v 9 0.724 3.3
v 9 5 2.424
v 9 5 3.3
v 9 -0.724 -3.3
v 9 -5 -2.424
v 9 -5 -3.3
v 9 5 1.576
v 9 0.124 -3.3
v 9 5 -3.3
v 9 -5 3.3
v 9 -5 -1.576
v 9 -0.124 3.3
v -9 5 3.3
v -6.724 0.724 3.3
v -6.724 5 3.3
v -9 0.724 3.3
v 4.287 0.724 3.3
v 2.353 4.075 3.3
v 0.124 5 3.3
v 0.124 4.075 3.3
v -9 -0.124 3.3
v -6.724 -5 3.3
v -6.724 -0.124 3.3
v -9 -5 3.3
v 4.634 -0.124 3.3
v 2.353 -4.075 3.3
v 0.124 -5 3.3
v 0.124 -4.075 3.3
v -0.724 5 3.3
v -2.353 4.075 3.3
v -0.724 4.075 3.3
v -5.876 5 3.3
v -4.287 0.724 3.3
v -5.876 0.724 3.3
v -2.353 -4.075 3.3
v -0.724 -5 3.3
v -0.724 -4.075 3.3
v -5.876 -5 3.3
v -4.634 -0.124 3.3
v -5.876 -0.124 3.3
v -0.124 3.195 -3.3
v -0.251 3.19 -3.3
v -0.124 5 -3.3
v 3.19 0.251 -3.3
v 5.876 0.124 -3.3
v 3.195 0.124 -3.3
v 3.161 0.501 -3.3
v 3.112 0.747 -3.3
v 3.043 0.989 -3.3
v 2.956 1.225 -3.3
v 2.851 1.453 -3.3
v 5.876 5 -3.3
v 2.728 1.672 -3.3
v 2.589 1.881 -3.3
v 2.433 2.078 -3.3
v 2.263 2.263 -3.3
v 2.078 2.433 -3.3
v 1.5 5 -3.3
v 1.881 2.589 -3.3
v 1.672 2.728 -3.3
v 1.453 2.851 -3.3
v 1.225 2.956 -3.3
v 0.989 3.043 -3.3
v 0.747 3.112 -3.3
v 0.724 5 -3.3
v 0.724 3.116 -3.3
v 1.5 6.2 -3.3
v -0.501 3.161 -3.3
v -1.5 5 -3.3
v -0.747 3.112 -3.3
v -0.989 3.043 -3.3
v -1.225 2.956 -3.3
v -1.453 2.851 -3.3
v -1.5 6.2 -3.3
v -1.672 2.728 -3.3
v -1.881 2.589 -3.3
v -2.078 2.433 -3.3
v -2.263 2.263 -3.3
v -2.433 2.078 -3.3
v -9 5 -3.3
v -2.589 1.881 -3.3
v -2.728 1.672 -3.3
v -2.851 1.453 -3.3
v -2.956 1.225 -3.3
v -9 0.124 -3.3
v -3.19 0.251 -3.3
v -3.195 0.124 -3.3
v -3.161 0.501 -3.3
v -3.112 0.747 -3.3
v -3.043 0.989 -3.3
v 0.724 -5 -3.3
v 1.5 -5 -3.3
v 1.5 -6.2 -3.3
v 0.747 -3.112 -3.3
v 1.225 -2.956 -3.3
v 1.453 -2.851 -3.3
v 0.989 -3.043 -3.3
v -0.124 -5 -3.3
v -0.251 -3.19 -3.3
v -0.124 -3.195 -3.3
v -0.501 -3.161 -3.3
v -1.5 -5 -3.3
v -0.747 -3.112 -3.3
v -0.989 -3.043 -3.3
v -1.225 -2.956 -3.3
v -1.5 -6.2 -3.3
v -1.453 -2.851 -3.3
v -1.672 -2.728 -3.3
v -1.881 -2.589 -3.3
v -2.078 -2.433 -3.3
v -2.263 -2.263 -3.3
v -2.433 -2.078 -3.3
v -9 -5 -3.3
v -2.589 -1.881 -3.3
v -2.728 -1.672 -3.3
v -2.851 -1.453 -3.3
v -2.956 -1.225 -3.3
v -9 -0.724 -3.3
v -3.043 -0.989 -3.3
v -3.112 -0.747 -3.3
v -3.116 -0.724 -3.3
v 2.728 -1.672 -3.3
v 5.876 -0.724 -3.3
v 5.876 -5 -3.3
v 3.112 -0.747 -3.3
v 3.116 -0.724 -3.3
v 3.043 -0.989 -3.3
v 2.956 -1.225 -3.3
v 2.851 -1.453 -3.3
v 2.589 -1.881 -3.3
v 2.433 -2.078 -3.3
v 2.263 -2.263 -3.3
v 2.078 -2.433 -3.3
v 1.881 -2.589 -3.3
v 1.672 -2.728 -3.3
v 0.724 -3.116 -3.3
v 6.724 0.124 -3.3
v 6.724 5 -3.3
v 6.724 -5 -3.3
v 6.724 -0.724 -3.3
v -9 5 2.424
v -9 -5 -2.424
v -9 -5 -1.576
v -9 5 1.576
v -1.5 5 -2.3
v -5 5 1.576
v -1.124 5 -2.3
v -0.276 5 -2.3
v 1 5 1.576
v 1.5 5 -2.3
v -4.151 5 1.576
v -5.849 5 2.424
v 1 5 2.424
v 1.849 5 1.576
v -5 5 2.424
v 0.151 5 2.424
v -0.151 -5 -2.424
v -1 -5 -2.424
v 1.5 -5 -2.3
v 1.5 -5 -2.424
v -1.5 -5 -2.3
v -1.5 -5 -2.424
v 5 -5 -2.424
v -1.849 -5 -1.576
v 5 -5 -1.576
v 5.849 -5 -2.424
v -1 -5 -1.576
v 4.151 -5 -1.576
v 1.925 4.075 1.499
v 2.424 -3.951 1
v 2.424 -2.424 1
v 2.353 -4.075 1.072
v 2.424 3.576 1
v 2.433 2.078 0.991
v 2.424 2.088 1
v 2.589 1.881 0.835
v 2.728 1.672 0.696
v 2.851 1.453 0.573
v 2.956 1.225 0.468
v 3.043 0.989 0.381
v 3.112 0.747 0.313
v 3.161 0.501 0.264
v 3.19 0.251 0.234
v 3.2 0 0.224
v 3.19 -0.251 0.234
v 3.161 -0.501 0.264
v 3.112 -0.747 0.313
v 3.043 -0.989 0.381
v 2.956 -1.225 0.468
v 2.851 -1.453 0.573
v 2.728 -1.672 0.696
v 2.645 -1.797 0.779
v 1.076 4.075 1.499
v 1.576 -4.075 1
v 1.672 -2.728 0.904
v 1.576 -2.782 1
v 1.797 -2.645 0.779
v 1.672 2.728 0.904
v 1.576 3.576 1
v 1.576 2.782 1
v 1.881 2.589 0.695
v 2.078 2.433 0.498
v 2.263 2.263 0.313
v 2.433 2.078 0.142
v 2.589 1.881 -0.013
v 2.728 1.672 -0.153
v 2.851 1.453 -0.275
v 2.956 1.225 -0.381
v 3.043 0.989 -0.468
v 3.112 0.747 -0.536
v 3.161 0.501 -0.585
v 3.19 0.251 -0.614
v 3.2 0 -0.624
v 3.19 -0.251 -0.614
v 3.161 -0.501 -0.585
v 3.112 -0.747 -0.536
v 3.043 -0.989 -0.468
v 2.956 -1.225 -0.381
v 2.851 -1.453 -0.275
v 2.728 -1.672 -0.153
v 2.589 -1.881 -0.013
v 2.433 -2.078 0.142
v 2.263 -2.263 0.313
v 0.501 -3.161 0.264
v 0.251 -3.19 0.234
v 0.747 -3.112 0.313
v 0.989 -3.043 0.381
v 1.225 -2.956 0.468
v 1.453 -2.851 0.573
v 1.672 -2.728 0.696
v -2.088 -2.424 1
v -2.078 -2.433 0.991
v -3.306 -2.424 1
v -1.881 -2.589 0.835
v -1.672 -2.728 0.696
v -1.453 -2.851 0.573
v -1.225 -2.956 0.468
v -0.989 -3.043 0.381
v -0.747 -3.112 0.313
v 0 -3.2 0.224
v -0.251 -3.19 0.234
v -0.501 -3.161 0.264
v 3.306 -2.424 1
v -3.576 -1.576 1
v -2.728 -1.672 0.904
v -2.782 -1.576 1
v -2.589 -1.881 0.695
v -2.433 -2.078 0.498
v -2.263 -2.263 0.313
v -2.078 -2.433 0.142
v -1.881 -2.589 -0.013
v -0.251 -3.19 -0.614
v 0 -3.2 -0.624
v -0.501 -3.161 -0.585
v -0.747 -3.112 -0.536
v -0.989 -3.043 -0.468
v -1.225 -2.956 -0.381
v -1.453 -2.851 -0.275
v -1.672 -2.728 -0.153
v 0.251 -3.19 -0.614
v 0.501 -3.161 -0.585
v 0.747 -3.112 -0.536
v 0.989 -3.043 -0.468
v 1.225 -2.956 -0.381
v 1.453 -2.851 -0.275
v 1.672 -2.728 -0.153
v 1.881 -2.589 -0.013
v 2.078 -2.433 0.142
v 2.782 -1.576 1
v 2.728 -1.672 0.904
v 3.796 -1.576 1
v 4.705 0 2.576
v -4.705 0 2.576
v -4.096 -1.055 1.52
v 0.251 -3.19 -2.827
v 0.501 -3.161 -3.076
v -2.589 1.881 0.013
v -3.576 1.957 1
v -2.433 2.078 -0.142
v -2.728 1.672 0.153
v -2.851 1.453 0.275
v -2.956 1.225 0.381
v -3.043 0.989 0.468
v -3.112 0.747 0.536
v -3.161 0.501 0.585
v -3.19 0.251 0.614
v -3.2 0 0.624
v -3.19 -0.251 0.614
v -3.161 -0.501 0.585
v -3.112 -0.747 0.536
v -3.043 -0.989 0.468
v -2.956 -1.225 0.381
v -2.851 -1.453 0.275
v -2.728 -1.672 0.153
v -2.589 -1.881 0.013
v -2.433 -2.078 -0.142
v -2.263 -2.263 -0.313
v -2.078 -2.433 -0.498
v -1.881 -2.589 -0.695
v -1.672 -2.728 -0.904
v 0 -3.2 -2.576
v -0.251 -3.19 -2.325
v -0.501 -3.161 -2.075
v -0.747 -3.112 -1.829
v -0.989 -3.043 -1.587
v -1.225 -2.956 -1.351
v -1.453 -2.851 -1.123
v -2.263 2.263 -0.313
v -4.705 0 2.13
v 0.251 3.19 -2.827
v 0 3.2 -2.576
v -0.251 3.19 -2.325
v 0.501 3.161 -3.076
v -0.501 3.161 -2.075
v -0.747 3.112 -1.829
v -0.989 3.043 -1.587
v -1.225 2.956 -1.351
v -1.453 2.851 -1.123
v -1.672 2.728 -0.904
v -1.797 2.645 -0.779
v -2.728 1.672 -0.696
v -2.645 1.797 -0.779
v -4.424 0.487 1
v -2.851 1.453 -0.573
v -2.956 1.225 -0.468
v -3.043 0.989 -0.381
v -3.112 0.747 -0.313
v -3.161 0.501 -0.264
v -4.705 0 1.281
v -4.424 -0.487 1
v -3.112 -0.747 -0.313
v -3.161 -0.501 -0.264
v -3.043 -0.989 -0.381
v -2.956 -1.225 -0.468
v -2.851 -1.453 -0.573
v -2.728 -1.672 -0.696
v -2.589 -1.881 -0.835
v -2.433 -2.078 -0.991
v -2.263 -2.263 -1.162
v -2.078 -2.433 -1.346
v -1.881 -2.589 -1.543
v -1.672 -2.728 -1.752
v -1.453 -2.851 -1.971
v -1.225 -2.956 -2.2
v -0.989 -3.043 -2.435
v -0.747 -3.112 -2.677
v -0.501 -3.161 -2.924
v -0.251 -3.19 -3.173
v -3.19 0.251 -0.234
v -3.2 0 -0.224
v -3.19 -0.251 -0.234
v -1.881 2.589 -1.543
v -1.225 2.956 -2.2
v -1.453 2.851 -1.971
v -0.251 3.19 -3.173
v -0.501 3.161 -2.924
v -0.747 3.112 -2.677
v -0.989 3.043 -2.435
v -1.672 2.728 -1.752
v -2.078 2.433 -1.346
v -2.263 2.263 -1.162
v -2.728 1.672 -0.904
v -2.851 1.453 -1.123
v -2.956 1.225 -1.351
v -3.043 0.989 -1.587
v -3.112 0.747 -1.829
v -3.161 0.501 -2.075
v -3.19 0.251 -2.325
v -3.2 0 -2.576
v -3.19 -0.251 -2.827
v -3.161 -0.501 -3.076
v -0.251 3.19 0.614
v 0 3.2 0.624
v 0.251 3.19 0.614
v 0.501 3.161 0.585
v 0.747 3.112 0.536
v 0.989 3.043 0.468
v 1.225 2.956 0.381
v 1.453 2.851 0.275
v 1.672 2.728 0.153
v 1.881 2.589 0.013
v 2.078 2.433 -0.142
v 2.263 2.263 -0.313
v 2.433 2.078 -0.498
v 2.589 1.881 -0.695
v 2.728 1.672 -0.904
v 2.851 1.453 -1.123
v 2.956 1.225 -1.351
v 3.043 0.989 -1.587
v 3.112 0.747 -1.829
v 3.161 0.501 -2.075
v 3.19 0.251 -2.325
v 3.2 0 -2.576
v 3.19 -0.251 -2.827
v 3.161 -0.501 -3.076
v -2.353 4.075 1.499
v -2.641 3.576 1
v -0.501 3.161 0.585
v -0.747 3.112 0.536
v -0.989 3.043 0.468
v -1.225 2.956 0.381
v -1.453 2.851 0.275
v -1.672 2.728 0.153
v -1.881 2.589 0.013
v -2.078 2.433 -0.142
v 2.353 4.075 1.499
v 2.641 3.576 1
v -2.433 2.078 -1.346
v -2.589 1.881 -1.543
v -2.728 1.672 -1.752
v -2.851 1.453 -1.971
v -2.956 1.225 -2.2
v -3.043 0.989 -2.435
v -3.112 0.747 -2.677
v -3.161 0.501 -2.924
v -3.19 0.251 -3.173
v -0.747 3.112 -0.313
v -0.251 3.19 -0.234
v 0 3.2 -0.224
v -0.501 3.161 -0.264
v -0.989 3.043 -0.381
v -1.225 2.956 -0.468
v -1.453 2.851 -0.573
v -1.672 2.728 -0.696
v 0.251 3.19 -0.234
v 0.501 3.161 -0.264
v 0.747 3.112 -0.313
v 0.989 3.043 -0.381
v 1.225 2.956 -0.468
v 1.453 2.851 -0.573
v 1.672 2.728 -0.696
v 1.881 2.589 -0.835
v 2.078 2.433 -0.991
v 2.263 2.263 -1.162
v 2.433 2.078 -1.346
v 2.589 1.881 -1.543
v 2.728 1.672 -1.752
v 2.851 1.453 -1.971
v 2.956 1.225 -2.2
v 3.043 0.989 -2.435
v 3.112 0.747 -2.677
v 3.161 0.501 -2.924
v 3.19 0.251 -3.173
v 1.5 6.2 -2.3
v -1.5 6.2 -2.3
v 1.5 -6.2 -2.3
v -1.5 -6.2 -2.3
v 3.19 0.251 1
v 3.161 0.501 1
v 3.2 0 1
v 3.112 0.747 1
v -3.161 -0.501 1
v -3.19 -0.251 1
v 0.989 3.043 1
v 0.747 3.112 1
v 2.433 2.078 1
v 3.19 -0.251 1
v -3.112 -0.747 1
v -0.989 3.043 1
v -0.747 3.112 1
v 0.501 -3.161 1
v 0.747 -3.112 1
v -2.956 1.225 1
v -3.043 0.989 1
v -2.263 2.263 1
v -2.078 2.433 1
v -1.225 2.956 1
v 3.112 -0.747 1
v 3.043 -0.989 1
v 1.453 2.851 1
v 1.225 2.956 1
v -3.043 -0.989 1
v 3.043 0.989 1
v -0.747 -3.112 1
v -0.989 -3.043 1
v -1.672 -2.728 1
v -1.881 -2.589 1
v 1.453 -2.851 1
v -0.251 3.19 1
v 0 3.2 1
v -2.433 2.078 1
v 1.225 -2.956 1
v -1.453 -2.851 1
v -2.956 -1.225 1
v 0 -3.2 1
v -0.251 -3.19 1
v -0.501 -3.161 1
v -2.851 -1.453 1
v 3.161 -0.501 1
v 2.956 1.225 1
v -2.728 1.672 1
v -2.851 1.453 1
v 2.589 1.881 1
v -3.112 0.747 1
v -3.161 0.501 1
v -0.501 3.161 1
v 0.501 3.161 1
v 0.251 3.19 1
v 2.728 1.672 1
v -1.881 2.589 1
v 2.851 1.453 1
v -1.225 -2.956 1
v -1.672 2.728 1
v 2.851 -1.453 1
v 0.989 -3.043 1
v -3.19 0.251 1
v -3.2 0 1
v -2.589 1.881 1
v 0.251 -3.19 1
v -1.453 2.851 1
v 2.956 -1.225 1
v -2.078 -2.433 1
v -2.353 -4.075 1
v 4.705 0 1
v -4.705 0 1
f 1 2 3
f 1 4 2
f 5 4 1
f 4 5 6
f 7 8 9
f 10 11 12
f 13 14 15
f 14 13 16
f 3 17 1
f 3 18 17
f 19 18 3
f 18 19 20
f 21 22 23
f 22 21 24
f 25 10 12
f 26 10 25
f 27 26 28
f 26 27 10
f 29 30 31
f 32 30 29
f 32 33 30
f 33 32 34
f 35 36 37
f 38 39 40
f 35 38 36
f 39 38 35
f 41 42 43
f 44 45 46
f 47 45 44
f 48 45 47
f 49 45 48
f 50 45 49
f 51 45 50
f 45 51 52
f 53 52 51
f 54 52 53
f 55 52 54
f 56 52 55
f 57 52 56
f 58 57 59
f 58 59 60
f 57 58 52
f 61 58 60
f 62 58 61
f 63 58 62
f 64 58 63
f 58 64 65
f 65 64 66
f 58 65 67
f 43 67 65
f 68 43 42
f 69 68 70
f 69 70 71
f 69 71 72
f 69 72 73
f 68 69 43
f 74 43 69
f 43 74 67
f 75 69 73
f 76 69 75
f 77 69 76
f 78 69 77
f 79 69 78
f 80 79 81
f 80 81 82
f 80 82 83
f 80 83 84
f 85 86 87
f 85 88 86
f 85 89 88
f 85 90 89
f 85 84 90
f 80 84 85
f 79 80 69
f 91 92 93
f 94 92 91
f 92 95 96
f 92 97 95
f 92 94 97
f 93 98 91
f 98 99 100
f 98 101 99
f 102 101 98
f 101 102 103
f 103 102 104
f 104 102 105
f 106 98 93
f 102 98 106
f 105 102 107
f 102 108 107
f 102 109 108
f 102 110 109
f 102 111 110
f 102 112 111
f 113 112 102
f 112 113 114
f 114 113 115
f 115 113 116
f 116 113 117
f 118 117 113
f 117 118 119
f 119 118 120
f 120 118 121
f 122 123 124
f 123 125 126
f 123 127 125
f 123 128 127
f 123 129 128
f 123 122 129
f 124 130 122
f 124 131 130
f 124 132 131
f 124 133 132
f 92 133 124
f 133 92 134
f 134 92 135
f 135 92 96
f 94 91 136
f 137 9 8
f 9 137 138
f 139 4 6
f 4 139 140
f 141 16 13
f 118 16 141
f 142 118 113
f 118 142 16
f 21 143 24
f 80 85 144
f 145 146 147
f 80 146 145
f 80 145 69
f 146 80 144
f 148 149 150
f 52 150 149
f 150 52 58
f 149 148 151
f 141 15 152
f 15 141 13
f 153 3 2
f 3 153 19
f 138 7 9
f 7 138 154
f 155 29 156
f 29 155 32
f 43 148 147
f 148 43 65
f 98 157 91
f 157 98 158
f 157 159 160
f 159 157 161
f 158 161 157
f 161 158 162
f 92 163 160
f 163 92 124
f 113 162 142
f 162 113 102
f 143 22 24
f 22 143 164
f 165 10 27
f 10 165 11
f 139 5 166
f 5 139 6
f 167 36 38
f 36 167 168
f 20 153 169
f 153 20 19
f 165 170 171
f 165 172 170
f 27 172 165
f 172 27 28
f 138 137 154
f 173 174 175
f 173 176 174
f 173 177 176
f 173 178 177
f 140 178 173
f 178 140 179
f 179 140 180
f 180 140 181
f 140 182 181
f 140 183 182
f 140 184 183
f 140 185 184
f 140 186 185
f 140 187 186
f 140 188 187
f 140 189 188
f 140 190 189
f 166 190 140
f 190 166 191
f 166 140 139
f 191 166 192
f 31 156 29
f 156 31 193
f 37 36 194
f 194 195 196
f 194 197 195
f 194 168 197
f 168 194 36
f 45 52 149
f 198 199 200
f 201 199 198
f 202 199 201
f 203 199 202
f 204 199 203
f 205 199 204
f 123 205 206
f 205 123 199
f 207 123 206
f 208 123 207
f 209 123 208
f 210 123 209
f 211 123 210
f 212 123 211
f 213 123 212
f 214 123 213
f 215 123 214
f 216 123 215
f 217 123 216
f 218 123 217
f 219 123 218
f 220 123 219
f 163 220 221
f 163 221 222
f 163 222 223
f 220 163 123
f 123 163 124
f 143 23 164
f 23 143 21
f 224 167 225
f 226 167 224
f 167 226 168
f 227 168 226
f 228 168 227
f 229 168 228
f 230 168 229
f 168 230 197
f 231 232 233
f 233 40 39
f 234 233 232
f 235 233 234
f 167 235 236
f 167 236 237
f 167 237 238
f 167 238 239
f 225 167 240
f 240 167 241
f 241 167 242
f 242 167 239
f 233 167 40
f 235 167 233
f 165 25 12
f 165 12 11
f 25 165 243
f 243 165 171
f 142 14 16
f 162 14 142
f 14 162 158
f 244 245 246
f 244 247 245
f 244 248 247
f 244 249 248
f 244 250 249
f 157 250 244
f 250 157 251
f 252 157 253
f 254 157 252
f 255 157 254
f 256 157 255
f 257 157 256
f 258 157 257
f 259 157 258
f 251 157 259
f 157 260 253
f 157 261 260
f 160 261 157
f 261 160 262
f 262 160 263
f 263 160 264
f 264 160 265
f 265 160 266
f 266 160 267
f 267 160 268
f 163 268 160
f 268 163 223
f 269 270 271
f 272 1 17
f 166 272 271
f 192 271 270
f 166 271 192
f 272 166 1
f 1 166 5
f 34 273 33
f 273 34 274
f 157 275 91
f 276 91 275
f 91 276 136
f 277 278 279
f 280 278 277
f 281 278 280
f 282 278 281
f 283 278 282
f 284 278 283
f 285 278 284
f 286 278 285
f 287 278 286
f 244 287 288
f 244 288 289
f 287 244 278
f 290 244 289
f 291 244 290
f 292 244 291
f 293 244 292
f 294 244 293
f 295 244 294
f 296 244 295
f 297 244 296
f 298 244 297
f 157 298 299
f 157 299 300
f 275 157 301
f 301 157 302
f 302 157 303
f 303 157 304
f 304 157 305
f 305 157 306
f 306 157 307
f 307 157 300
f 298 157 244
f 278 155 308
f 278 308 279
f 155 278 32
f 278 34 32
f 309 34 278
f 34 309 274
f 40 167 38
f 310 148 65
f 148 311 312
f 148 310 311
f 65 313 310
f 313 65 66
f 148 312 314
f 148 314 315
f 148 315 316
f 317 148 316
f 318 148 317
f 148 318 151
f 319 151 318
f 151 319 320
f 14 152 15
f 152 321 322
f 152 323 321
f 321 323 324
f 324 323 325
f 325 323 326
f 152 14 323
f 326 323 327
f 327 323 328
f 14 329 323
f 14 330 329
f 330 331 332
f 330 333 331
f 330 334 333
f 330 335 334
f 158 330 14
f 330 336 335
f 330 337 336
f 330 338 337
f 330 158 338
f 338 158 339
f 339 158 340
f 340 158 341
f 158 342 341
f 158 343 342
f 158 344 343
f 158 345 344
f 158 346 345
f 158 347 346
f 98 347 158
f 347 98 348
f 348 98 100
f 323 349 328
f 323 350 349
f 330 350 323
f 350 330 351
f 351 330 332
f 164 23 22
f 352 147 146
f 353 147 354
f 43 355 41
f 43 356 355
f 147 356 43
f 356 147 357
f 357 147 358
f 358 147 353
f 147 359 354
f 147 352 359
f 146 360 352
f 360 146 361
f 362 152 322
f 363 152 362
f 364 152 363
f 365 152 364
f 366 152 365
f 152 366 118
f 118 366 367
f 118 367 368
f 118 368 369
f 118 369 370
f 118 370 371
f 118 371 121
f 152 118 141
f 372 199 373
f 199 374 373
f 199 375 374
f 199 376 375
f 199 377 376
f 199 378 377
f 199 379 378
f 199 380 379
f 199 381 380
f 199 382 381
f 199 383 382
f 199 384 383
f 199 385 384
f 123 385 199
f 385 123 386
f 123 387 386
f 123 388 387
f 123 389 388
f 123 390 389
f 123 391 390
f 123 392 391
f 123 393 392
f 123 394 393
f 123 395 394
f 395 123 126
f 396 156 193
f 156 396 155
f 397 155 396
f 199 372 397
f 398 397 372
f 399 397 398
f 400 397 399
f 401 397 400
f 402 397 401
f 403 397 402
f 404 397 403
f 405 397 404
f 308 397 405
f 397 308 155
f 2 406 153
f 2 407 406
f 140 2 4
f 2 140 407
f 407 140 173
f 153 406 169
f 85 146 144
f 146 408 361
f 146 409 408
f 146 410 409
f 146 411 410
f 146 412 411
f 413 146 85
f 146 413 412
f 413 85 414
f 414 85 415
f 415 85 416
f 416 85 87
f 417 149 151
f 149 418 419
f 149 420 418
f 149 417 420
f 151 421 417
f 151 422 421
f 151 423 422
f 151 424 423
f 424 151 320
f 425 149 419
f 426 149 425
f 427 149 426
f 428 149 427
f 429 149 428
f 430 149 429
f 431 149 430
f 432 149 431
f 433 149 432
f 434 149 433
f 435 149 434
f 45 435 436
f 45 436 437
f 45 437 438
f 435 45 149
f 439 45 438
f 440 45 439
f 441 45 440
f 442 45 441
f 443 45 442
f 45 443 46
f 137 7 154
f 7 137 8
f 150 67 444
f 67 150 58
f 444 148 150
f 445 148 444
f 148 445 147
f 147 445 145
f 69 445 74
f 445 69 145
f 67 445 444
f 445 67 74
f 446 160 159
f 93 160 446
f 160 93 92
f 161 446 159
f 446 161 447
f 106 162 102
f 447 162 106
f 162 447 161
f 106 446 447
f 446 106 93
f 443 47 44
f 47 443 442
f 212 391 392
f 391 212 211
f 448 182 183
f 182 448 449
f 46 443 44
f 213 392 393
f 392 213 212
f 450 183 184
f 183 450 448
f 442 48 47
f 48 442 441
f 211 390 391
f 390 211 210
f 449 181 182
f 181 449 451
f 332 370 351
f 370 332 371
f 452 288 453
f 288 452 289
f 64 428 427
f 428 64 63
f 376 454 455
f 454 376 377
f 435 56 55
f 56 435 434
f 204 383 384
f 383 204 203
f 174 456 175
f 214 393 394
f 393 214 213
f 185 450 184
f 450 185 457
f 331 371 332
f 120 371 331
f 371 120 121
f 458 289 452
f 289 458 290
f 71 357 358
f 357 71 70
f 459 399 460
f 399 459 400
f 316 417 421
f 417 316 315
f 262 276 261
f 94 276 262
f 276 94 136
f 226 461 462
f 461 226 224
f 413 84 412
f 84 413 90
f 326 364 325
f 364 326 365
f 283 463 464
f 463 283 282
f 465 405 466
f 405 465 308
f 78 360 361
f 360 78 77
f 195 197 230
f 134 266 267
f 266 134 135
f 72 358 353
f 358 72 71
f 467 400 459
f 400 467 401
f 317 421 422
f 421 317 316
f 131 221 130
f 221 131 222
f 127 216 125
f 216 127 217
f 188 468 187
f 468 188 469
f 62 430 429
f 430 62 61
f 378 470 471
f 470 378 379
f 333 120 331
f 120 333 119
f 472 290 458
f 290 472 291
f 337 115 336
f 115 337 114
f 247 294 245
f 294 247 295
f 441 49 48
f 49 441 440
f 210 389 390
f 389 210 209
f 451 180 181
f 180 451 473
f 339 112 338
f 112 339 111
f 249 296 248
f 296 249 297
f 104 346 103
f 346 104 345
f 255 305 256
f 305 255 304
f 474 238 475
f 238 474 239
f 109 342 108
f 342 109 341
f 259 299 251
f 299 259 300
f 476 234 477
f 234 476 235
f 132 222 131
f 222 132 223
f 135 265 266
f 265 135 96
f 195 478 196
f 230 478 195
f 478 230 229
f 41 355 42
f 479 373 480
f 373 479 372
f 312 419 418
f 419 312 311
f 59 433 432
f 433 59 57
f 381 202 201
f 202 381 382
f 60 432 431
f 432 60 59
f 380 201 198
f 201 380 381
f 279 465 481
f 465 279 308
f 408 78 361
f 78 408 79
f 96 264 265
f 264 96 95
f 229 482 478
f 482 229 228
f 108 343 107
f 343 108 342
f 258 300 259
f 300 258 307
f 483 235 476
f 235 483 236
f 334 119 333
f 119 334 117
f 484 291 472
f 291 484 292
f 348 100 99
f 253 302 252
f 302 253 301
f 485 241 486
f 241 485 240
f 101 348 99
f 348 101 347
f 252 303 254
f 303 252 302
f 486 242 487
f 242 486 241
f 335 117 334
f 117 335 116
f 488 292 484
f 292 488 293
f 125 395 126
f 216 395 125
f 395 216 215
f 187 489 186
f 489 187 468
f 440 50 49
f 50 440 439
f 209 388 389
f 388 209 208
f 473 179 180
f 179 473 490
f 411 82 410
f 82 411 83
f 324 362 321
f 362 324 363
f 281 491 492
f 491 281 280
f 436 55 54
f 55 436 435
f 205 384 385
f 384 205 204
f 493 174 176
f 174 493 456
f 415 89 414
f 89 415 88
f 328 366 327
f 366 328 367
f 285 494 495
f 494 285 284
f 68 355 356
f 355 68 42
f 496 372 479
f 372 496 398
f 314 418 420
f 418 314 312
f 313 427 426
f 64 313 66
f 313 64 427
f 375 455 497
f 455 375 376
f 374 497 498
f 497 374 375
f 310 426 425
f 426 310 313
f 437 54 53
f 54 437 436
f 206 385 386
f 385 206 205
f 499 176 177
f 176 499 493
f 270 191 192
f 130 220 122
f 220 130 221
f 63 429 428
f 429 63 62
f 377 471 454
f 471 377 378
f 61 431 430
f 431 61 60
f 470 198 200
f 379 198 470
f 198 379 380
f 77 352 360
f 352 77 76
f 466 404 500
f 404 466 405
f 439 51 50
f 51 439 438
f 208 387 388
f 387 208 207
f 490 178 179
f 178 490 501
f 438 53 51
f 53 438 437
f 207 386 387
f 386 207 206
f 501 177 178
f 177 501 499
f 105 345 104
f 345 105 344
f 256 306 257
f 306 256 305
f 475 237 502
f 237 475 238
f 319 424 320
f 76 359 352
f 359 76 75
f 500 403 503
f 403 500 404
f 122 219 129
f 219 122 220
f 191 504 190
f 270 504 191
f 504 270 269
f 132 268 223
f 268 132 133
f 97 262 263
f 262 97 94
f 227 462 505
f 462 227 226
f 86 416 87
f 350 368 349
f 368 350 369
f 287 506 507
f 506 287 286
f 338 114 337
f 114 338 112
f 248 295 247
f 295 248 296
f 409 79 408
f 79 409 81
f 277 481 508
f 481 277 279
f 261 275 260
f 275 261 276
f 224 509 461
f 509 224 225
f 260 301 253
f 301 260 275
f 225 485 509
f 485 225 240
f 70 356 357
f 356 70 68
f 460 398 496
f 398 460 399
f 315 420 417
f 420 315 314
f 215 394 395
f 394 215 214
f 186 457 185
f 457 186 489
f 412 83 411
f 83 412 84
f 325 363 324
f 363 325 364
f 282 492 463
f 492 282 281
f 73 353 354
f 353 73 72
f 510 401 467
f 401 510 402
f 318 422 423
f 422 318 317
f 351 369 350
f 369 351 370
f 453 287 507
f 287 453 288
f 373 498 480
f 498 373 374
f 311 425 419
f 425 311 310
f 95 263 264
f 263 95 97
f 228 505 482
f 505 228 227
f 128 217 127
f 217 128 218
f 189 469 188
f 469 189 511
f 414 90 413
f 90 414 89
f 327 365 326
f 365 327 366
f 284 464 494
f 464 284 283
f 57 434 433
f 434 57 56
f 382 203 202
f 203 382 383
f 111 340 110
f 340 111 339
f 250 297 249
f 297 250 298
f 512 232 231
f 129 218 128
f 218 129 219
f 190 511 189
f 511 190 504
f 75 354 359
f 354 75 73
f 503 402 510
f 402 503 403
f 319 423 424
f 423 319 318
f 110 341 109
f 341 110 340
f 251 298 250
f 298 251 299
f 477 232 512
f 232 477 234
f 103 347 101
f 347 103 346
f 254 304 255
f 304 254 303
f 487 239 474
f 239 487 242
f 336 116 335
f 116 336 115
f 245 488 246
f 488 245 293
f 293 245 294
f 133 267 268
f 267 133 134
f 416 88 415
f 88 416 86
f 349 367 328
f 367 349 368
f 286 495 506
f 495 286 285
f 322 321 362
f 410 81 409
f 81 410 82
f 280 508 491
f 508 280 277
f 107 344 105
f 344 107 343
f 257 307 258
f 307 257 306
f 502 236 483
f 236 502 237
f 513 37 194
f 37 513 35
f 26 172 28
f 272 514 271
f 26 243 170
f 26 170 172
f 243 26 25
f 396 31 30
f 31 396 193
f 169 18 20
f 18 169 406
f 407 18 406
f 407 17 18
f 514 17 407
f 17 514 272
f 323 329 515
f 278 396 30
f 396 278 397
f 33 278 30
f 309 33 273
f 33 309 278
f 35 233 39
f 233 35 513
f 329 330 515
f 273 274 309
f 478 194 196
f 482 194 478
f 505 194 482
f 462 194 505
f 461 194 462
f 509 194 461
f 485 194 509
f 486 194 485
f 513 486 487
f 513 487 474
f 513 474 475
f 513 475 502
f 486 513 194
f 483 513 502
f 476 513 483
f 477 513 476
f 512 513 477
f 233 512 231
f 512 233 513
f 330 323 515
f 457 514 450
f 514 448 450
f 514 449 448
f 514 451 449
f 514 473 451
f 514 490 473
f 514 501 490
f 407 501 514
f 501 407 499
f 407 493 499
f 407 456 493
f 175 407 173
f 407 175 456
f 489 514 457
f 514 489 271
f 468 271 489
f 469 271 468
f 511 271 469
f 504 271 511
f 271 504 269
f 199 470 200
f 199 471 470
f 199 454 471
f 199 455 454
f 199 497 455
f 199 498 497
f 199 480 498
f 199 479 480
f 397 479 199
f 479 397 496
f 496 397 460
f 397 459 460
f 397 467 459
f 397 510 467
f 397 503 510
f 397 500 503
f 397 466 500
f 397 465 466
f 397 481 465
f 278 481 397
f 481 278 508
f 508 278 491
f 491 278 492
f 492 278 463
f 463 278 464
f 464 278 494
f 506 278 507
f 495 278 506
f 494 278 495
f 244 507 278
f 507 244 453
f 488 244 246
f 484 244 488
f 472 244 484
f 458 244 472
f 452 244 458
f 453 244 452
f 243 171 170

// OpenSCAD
$fn = 80;

// T-slot nut parameters (mm)
screw_d = 6.0;          // screw size (M6 nominal)
across_flats = 8.0;     // hex across flats
thickness = 6.6;        // nut thickness

// Practical clearances (mm)
hole_clear = 0.4;       // clearance on screw hole diameter
hex_clear  = 0.15;      // clearance on hex pocket across flats (if used)
chamfer_h  = 0.6;       // top/bottom edge chamfer height

// T-slot nut body sizing (generic, printable, fits many 8/10-series slots)
// Adjust these if you have a specific extrusion slot standard.
body_len = 18.0;
body_wid = 10.0;

// Anti-rotation nibs (optional)
nibs_on = true;
nib_len = 3.0;
nib_wid = 1.2;
nib_h   = 1.0;

// Derived
hole_d = screw_d + hole_clear;
hex_flat = across_flats + hex_clear;
hex_r = hex_flat / sqrt(3); // circumradius for hex with given across-flats

module chamfered_block(l, w, h, c) {
    // Chamfer top and bottom edges by subtracting 45° wedges
    difference() {
        cube([l, w, h], center=true);

        // Top chamfer
        translate([0, 0, h/2 - c/2])
            rotate([0, 45, 0])
                cube([l*2, w*2, c], center=true);

        translate([0, 0, h/2 - c/2])
            rotate([45, 0, 0])
                cube([l*2, w*2, c], center=true);

        // Bottom chamfer
        translate([0, 0, -h/2 + c/2])
            rotate([0, 45, 0])
                cube([l*2, w*2, c], center=true);

        translate([0, 0, -h/2 + c/2])
            rotate([45, 0, 0])
                cube([l*2, w*2, c], center=true);
    }
}

module tslot_nut() {
    difference() {
        union() {
            chamfered_block(body_len, body_wid, thickness, chamfer_h);

            if (nibs_on) {
                // Two small nibs on the long sides to help prevent rotation in slot
                translate([0,  body_wid/2 + nib_wid/2, -thickness/2 + nib_h/2])
                    cube([nib_len, nib_wid, nib_h], center=true);
                translate([0, -body_wid/2 - nib_wid/2, -thickness/2 + nib_h/2])
                    cube([nib_len, nib_wid, nib_h], center=true);
            }
        }

        // Through hole for M6 screw
        cylinder(d=hole_d, h=thickness + 2, center=true);

        // Optional hex pocket on one face (for captive nut behavior if desired)
        // Here we include a shallow hex recess on the top face.
        translate([0, 0, thickness/2 - 2.2/2])
            cylinder(r=hex_r, h=2.2 + 0.2, center=true, $fn=6);
    }
}

tslot_nut();
